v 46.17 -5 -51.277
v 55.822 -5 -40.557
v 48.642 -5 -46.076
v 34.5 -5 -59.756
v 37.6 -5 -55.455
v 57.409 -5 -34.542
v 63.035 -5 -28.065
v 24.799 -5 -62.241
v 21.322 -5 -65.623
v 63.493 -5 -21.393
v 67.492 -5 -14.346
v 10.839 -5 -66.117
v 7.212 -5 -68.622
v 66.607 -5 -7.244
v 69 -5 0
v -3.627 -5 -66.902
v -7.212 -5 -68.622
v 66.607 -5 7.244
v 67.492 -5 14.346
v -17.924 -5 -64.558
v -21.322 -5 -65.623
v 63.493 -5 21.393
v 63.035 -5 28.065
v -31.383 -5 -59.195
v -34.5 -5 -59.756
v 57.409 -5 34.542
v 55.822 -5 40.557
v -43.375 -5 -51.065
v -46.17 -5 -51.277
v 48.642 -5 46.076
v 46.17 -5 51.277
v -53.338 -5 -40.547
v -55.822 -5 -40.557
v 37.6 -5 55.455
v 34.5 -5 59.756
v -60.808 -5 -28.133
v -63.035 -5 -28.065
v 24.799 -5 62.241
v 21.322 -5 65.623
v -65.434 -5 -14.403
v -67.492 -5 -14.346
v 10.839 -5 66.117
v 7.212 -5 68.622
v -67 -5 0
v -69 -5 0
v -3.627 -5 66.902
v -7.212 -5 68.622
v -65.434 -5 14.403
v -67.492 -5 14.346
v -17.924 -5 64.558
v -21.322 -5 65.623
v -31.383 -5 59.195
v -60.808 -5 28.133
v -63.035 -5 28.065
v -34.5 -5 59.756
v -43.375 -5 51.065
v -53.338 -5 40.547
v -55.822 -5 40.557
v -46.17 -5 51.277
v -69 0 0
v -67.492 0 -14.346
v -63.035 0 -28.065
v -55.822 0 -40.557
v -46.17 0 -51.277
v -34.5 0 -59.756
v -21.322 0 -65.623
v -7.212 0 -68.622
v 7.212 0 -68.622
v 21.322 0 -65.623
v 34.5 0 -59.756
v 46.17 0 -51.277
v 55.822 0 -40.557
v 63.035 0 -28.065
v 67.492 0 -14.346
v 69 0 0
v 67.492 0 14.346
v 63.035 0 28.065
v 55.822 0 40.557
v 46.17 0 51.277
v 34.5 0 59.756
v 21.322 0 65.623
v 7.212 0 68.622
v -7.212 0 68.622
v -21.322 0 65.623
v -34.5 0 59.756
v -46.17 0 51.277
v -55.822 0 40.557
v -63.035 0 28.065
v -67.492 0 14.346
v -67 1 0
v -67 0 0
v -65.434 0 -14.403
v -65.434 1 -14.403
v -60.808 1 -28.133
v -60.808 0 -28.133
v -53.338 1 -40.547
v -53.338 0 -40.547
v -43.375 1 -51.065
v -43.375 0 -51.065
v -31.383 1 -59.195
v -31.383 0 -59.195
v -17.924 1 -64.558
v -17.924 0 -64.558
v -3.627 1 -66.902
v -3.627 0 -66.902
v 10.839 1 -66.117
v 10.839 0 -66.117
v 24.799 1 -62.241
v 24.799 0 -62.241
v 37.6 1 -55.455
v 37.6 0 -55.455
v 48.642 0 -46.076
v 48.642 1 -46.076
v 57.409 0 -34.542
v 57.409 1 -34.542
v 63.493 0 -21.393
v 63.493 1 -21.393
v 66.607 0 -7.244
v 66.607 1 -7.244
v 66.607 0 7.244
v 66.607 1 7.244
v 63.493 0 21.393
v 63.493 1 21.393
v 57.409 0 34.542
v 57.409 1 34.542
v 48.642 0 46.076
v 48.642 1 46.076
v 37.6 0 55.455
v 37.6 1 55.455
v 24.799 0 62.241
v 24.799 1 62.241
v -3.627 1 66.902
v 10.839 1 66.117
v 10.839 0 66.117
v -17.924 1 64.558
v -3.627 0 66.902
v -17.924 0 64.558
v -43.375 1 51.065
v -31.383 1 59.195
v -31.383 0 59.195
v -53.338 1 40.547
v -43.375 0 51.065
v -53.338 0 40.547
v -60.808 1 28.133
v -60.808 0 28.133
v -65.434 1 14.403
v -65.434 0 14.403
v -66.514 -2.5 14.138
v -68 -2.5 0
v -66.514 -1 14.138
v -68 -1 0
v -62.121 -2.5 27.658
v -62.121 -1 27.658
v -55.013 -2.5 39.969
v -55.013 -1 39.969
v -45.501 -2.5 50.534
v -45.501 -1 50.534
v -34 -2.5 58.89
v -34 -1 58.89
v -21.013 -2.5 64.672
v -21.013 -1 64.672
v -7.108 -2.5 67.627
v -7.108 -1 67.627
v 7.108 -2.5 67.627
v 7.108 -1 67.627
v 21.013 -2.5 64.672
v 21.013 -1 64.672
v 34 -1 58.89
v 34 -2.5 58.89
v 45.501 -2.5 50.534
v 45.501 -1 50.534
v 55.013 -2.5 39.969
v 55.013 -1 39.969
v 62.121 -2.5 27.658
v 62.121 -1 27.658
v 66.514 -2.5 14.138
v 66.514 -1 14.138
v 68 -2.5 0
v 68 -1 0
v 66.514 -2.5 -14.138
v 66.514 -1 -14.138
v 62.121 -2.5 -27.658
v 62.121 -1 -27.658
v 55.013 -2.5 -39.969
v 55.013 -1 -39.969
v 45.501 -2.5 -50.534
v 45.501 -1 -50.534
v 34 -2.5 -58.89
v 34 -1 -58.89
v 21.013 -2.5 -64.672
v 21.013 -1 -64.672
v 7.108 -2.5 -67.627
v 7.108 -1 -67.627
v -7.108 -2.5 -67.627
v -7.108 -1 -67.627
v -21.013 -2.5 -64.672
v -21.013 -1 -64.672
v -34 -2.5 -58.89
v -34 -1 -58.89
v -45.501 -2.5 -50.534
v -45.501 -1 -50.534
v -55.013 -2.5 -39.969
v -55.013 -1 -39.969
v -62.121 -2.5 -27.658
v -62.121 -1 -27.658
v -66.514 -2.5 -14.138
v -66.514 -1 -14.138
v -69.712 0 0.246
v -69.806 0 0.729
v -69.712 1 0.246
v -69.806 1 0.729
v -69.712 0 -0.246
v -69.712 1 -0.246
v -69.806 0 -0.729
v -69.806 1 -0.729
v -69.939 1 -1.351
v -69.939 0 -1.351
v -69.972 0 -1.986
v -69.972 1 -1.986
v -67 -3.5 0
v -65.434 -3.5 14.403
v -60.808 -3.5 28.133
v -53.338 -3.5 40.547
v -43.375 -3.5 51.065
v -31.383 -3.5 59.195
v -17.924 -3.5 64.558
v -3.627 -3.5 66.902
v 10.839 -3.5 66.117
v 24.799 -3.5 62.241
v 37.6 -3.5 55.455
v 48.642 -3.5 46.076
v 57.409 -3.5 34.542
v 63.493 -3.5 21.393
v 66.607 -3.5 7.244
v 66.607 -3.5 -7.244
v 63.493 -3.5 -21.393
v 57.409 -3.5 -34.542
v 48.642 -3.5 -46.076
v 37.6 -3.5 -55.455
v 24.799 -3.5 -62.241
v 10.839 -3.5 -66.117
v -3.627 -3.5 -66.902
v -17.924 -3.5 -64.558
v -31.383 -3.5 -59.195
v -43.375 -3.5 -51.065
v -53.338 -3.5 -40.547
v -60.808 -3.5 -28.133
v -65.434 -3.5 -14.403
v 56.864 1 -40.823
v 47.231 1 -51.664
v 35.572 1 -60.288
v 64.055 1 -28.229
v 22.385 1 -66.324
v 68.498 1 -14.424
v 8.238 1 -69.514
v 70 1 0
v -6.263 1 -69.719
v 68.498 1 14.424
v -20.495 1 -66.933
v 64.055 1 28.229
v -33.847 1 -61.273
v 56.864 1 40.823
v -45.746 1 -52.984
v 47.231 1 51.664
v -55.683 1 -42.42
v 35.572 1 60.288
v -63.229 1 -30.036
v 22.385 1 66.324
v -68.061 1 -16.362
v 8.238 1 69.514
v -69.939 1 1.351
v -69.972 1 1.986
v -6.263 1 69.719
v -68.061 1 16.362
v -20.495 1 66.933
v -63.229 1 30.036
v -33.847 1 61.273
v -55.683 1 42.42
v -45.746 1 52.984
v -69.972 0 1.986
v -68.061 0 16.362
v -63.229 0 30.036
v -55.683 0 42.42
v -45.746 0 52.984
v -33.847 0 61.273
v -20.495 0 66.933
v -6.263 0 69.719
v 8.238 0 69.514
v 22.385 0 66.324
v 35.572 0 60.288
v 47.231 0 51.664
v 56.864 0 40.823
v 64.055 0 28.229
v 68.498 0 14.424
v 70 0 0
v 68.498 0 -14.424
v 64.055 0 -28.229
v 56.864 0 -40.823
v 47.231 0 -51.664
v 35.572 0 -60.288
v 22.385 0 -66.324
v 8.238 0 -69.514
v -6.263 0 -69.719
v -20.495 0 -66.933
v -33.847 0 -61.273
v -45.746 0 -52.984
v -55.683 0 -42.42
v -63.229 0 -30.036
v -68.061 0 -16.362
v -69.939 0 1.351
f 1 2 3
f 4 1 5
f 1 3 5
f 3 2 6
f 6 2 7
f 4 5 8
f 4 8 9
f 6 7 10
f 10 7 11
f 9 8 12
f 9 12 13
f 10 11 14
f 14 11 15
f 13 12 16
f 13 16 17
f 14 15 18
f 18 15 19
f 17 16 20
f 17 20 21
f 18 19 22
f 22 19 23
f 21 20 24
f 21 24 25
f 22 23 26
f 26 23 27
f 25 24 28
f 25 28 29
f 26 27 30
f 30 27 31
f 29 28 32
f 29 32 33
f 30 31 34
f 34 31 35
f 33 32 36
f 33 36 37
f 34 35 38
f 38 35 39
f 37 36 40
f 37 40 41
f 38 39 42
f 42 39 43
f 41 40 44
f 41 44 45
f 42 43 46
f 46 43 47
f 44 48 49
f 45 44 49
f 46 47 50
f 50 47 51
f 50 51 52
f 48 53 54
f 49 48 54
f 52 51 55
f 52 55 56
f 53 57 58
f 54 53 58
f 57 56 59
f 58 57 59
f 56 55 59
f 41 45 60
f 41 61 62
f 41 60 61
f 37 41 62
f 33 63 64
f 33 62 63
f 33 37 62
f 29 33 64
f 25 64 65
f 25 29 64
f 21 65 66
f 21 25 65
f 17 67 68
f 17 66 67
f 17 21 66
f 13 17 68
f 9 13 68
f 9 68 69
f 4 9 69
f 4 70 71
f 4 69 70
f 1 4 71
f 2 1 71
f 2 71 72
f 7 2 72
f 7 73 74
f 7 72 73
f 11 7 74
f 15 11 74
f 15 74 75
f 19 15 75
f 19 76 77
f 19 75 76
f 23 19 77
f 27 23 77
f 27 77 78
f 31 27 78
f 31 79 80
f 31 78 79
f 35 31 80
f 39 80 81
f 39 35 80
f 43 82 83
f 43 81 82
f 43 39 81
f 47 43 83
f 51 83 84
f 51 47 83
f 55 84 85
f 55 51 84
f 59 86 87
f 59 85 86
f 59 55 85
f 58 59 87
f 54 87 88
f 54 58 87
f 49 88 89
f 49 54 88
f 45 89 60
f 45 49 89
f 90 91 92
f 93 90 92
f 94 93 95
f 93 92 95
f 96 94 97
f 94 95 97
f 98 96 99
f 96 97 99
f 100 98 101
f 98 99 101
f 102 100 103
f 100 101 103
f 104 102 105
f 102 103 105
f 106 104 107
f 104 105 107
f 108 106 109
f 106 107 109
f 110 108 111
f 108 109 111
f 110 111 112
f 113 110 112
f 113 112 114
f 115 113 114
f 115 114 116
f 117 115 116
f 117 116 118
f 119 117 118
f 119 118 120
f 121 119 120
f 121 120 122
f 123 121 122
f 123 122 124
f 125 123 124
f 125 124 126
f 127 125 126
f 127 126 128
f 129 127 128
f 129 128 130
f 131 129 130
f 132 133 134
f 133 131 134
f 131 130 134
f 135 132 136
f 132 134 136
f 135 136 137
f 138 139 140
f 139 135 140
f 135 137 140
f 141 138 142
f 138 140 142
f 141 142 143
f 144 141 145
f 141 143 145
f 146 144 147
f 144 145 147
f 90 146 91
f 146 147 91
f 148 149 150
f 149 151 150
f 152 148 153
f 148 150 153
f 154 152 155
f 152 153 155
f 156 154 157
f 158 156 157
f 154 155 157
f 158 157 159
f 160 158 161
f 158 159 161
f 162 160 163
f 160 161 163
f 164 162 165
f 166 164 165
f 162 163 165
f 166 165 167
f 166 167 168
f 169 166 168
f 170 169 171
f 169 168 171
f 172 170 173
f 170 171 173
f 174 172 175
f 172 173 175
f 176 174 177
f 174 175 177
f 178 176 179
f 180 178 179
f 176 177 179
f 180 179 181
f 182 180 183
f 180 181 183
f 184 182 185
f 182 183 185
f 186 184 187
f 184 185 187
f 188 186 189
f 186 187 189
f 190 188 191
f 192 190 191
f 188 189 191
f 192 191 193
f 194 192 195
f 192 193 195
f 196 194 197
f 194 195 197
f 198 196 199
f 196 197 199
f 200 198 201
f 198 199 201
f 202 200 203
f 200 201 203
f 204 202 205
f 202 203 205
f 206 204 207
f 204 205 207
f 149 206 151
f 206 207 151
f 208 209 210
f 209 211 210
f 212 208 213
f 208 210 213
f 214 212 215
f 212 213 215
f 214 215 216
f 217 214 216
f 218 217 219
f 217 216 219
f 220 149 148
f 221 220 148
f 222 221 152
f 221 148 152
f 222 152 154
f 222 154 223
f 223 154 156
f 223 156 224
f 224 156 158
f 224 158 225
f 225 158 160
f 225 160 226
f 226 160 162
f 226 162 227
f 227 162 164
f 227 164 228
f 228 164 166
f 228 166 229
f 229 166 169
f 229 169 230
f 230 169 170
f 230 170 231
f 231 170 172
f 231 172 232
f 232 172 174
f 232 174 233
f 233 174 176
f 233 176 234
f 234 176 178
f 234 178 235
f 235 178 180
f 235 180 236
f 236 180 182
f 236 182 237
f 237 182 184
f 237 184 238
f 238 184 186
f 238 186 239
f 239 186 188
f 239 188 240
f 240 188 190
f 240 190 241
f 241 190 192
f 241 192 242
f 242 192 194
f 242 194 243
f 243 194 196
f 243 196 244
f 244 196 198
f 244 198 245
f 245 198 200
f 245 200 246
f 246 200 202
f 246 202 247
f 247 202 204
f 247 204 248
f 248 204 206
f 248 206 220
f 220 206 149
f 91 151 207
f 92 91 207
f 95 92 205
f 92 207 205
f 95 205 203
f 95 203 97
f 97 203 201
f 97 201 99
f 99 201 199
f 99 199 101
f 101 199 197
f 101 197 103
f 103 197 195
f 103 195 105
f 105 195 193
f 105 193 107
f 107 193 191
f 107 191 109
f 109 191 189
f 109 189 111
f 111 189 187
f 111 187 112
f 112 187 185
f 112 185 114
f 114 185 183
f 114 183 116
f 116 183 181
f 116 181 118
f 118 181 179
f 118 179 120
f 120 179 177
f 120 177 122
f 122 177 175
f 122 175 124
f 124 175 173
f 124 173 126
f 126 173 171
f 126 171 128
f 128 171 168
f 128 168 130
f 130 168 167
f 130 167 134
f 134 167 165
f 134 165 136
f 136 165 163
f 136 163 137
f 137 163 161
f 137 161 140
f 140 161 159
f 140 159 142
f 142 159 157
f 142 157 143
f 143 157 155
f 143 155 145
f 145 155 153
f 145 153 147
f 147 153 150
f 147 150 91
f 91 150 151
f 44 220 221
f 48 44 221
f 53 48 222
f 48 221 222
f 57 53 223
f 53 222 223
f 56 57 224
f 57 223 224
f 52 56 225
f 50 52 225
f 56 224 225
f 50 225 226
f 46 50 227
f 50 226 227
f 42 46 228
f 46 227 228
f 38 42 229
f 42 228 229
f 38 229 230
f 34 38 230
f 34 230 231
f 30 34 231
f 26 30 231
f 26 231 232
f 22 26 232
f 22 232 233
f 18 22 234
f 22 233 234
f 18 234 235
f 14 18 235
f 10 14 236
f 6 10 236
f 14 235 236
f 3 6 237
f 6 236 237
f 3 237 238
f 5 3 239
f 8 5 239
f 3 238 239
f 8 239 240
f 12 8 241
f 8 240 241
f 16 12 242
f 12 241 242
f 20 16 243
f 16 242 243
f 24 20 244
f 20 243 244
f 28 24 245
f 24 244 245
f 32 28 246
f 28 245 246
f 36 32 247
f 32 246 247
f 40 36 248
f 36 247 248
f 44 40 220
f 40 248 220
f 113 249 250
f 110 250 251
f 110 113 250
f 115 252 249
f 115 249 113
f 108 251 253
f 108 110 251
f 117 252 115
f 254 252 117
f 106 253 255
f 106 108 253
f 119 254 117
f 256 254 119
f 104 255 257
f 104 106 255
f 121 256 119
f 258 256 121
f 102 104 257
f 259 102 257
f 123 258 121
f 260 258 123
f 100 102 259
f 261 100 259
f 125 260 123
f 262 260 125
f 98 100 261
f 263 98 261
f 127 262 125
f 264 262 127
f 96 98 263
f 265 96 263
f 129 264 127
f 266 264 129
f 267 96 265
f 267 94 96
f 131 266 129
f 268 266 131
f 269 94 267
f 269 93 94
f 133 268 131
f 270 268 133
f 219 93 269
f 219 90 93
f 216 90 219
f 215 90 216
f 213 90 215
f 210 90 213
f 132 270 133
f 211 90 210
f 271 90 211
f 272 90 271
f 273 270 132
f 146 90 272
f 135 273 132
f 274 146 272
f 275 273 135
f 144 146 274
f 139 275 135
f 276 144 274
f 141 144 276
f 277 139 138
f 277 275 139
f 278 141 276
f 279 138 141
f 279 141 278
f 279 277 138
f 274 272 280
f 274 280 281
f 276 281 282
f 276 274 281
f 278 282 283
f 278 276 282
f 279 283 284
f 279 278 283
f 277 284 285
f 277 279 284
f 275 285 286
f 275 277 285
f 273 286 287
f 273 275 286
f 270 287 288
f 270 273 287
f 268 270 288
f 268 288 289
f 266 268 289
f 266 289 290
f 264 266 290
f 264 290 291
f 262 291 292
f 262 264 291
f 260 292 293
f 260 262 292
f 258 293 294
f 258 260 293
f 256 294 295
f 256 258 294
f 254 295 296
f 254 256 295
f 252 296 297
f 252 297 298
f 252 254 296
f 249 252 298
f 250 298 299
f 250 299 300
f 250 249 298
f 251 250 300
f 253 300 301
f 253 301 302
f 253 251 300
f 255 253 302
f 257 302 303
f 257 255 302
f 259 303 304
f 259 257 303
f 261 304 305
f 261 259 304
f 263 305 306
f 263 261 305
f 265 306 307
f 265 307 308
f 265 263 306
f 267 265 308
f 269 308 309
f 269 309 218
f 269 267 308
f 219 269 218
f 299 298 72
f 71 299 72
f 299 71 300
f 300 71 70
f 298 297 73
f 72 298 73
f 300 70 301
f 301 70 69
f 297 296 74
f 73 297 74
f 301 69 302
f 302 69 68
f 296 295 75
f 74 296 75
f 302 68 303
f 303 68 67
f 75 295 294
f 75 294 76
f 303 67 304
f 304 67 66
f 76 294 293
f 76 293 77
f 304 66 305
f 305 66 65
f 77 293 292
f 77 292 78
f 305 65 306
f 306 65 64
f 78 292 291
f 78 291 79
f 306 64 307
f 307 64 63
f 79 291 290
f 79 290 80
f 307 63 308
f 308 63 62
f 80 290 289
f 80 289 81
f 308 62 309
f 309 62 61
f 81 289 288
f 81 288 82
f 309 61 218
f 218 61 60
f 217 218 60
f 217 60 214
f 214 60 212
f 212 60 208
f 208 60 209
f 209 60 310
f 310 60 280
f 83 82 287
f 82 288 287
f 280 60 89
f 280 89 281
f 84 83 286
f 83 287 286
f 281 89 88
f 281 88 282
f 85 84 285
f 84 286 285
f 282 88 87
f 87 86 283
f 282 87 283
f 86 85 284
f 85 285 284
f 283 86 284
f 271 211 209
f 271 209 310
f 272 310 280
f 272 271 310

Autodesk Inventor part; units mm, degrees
ref_plane "YZ Plane" through (0, 0, 0) normal (1, 0, 0) x (0, 1, 0)
ref_plane "XZ Plane" through (0, 0, 0) normal (0, 1, 0) x (-1, 0, 0)
ref_plane "XY Plane" through (0, 0, 0) normal (0, 0, 1) x (1, 0, 0)
sketch "Sketch1" plane through (0, 0, 0) normal (0, 0, 1) x (1, 0, 0)
  line L0 (-67, 0) -> (-70, 0)
  line L1 (-70, 0) -> (-70, 1)
  line L2 (-70, 1) -> (-67, 1)
  line L3 (-67, 1) -> (-67, 0)
  line L4 (-67, 0) -> (-69, 0)
  line L5 (-69, 0) -> (-69, -5)
  line L6 (-69, -5) -> (-67, -5)
  line L7 (-67, -5) -> (-67, 0)
  line L8 (-61.5, -0.5) -> (-67.5, -0.5)
  line L9 (-67.5, -0.5) -> (-67.5, -3)
  line L10 (-67.5, -3) -> (-61.5, -3)
  line L11 (-61.5, -3) -> (-61.5, -0.5)
  line L12 (-67, -3.5) -> (-68, -2.5)
  line L13 (-68, -2.5) -> (-68, -1)
  line L14 (-68, -1) -> (-67, 0)
  line L15 (0, -6.2) -> (0, 2.2) projected
  point P0 (0, 0)
  point P1 (-69, 0)
  point P2 (-67.5, -1.75)
  point P3 (-70, 0.5)
  point P4 (-68, -1.75)
  dimension "d0" = 5
  dimension "d1" = 69
  dimension "d4" = 1
  dimension "d5" = 2.5
  dimension "d6" = 67.5
  dimension "d7" = 67
  dimension "d9" = 3.5
  dimension "d11" = 2
  dimension "d12" = 6
  dimension "d13" = 0.5
  dimension "d27" = 0.5
  dimension "d28" = 1
revolve "Revolution1" add sketch "Sketch1" angle 360 about axis through (0, -10, 0) along (0, 1, 0) contours L14 L13 L12 L7 L6 L5 L0 | L0 L1 L2 L3
sketch "Sketch2" plane through (0, 1, 0) normal (0, 1, 0) x (1, 0, 0)
  circle A0 centre (-72.25, 0) radius 2.55
  point P0 (0, 0)
  dimension "d16" = 5.1
  dimension "d17" = 72.25
extrude "Extrusion1" cut sketch "Sketch2" against normal through all
sketch "Sketch3" plane through (0, -5, 0) normal (0, -1, 0) x (0, 0, 1)
  arc A0 (-68.9899, -1.1809) -> (-68.9899, 1.1809) centre (-71.25, 0) ccw projected
  circle A1 centre (-71.25, 0) radius 4
  point P0 (0, 0)
  dimension "d20" = 8
extrude "Extrusion2" [suppressed]
fillet "Fillet1" radius 4 2 edges at (-69.99, 0.5, -1.1811) (-69.99, 0.5, 1.1811)
pattern_circular "Circular Pattern1" [suppressed]
properties part number "Ring Bearing Track"
